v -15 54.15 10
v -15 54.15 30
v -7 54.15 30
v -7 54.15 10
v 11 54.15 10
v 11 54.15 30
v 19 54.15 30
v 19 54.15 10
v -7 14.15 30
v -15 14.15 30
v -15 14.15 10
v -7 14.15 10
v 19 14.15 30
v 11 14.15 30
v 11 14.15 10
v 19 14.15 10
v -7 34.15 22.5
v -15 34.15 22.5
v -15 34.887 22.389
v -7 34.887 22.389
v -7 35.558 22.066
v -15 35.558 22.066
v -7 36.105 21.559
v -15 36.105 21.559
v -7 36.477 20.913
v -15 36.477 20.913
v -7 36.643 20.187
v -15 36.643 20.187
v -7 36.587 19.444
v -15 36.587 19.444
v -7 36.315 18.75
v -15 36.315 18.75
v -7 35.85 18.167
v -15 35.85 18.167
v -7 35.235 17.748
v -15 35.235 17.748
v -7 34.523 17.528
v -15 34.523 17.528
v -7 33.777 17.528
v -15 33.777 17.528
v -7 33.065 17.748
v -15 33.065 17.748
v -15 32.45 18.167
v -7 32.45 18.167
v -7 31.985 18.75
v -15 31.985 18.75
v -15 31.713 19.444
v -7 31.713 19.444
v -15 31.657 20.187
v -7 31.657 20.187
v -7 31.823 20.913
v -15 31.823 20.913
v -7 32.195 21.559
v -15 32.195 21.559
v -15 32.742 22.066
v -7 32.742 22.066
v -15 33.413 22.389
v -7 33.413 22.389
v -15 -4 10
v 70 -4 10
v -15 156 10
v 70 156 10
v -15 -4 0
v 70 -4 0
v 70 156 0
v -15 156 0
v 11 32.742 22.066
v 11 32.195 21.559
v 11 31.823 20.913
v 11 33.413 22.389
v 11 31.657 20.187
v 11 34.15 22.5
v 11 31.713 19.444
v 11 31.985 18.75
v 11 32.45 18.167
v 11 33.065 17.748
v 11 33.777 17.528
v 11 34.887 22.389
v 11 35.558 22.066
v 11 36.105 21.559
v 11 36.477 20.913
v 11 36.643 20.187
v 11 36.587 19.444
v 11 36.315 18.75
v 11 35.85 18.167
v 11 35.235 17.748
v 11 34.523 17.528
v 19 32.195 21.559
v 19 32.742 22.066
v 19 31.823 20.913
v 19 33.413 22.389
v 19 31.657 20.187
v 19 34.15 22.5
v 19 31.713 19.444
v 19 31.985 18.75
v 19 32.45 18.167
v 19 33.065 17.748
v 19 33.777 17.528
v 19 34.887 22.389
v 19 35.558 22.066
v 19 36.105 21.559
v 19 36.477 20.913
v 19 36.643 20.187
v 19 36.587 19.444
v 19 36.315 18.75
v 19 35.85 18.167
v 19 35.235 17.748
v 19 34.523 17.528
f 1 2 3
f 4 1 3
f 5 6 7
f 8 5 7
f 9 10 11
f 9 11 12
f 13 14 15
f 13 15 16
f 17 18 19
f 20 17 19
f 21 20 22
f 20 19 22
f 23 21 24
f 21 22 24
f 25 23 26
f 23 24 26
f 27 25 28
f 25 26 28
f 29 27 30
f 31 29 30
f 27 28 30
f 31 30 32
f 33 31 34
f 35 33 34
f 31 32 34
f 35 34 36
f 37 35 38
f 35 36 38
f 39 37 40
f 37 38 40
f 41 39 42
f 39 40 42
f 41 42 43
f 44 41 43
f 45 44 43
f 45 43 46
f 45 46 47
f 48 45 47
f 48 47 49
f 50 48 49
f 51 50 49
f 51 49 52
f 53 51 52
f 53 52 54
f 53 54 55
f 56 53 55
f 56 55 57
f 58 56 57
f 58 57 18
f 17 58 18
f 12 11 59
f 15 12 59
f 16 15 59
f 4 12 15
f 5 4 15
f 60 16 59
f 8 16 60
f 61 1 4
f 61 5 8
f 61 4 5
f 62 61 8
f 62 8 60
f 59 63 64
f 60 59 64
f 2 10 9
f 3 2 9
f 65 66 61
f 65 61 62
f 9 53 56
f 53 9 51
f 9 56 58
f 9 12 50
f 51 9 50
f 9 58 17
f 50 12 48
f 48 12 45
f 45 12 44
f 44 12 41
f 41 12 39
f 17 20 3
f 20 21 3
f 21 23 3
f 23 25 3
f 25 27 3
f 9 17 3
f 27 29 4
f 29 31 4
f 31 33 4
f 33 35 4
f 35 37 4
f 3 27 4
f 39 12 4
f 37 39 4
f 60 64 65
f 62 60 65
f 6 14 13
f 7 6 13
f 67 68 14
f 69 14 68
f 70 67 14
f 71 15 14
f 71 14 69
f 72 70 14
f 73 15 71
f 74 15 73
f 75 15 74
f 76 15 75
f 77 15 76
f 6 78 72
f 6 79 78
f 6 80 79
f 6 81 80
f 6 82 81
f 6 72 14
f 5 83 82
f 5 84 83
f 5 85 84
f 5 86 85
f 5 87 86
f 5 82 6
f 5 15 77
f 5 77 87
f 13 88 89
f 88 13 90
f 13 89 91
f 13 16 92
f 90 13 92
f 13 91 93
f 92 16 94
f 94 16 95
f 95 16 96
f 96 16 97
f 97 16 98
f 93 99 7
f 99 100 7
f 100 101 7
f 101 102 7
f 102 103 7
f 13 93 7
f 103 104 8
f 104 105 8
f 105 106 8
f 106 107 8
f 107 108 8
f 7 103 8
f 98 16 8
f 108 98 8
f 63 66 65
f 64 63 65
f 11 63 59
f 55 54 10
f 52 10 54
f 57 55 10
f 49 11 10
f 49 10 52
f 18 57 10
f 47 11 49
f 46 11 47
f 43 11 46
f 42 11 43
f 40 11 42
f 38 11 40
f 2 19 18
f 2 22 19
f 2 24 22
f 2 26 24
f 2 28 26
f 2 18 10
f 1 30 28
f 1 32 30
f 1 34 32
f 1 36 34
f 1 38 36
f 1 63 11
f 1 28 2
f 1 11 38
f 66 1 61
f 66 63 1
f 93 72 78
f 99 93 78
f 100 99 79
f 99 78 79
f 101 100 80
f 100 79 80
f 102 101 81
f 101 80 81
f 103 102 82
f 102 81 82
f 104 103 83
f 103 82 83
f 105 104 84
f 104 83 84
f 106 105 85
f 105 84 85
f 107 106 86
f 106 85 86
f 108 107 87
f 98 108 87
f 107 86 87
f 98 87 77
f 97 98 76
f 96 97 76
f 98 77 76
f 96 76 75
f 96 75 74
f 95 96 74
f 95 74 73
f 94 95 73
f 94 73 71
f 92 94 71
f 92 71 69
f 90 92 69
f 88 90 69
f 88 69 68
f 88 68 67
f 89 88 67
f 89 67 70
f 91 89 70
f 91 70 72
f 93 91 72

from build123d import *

# Parameters (mm, degrees)
SKETCH1_W           = 85
SKETCH1_H           = 160
BOSS_EXTRUDE1_DEPTH = 10
SKETCH2_W           = 8
SKETCH2_H           = 40
BOSS_EXTRUDE2_DEPTH = 20
SKETCH4_W           = 8
SKETCH4_H           = 40
BOSS_EXTRUDE3_DEPTH = 20
SKETCH3_R           = 2.5
CUT_EXTRUDE1_DEPTH  = 34


with BuildPart() as part:
    # Sketch1 → Boss-Extrude1 (new body)
    with BuildSketch(Plane.XY):
        with Locations((27.5, 76)):
            Rectangle(SKETCH1_W, SKETCH1_H)
    extrude(amount=BOSS_EXTRUDE1_DEPTH)

    # Sketch2 → Boss-Extrude2 (add)
    with BuildSketch(Plane.XY.offset(10)):
        with Locations((-11, 34.15)):
            Rectangle(SKETCH2_W, SKETCH2_H)
    extrude(amount=BOSS_EXTRUDE2_DEPTH)

    # Sketch4 → Boss-Extrude3 (add)
    with BuildSketch(Plane.XY.offset(10)):
        with Locations((15, 34.15)):
            Rectangle(SKETCH4_W, SKETCH4_H)
    extrude(amount=BOSS_EXTRUDE3_DEPTH)

    # Sketch3 → Cut-Extrude1 (cut)
    with BuildSketch(Plane.ZY.offset(15)):
        with Locations((20, 34.15)):
            Circle(SKETCH3_R)
    extrude(amount=-CUT_EXTRUDE1_DEPTH, mode=Mode.SUBTRACT)


solid = part.part
